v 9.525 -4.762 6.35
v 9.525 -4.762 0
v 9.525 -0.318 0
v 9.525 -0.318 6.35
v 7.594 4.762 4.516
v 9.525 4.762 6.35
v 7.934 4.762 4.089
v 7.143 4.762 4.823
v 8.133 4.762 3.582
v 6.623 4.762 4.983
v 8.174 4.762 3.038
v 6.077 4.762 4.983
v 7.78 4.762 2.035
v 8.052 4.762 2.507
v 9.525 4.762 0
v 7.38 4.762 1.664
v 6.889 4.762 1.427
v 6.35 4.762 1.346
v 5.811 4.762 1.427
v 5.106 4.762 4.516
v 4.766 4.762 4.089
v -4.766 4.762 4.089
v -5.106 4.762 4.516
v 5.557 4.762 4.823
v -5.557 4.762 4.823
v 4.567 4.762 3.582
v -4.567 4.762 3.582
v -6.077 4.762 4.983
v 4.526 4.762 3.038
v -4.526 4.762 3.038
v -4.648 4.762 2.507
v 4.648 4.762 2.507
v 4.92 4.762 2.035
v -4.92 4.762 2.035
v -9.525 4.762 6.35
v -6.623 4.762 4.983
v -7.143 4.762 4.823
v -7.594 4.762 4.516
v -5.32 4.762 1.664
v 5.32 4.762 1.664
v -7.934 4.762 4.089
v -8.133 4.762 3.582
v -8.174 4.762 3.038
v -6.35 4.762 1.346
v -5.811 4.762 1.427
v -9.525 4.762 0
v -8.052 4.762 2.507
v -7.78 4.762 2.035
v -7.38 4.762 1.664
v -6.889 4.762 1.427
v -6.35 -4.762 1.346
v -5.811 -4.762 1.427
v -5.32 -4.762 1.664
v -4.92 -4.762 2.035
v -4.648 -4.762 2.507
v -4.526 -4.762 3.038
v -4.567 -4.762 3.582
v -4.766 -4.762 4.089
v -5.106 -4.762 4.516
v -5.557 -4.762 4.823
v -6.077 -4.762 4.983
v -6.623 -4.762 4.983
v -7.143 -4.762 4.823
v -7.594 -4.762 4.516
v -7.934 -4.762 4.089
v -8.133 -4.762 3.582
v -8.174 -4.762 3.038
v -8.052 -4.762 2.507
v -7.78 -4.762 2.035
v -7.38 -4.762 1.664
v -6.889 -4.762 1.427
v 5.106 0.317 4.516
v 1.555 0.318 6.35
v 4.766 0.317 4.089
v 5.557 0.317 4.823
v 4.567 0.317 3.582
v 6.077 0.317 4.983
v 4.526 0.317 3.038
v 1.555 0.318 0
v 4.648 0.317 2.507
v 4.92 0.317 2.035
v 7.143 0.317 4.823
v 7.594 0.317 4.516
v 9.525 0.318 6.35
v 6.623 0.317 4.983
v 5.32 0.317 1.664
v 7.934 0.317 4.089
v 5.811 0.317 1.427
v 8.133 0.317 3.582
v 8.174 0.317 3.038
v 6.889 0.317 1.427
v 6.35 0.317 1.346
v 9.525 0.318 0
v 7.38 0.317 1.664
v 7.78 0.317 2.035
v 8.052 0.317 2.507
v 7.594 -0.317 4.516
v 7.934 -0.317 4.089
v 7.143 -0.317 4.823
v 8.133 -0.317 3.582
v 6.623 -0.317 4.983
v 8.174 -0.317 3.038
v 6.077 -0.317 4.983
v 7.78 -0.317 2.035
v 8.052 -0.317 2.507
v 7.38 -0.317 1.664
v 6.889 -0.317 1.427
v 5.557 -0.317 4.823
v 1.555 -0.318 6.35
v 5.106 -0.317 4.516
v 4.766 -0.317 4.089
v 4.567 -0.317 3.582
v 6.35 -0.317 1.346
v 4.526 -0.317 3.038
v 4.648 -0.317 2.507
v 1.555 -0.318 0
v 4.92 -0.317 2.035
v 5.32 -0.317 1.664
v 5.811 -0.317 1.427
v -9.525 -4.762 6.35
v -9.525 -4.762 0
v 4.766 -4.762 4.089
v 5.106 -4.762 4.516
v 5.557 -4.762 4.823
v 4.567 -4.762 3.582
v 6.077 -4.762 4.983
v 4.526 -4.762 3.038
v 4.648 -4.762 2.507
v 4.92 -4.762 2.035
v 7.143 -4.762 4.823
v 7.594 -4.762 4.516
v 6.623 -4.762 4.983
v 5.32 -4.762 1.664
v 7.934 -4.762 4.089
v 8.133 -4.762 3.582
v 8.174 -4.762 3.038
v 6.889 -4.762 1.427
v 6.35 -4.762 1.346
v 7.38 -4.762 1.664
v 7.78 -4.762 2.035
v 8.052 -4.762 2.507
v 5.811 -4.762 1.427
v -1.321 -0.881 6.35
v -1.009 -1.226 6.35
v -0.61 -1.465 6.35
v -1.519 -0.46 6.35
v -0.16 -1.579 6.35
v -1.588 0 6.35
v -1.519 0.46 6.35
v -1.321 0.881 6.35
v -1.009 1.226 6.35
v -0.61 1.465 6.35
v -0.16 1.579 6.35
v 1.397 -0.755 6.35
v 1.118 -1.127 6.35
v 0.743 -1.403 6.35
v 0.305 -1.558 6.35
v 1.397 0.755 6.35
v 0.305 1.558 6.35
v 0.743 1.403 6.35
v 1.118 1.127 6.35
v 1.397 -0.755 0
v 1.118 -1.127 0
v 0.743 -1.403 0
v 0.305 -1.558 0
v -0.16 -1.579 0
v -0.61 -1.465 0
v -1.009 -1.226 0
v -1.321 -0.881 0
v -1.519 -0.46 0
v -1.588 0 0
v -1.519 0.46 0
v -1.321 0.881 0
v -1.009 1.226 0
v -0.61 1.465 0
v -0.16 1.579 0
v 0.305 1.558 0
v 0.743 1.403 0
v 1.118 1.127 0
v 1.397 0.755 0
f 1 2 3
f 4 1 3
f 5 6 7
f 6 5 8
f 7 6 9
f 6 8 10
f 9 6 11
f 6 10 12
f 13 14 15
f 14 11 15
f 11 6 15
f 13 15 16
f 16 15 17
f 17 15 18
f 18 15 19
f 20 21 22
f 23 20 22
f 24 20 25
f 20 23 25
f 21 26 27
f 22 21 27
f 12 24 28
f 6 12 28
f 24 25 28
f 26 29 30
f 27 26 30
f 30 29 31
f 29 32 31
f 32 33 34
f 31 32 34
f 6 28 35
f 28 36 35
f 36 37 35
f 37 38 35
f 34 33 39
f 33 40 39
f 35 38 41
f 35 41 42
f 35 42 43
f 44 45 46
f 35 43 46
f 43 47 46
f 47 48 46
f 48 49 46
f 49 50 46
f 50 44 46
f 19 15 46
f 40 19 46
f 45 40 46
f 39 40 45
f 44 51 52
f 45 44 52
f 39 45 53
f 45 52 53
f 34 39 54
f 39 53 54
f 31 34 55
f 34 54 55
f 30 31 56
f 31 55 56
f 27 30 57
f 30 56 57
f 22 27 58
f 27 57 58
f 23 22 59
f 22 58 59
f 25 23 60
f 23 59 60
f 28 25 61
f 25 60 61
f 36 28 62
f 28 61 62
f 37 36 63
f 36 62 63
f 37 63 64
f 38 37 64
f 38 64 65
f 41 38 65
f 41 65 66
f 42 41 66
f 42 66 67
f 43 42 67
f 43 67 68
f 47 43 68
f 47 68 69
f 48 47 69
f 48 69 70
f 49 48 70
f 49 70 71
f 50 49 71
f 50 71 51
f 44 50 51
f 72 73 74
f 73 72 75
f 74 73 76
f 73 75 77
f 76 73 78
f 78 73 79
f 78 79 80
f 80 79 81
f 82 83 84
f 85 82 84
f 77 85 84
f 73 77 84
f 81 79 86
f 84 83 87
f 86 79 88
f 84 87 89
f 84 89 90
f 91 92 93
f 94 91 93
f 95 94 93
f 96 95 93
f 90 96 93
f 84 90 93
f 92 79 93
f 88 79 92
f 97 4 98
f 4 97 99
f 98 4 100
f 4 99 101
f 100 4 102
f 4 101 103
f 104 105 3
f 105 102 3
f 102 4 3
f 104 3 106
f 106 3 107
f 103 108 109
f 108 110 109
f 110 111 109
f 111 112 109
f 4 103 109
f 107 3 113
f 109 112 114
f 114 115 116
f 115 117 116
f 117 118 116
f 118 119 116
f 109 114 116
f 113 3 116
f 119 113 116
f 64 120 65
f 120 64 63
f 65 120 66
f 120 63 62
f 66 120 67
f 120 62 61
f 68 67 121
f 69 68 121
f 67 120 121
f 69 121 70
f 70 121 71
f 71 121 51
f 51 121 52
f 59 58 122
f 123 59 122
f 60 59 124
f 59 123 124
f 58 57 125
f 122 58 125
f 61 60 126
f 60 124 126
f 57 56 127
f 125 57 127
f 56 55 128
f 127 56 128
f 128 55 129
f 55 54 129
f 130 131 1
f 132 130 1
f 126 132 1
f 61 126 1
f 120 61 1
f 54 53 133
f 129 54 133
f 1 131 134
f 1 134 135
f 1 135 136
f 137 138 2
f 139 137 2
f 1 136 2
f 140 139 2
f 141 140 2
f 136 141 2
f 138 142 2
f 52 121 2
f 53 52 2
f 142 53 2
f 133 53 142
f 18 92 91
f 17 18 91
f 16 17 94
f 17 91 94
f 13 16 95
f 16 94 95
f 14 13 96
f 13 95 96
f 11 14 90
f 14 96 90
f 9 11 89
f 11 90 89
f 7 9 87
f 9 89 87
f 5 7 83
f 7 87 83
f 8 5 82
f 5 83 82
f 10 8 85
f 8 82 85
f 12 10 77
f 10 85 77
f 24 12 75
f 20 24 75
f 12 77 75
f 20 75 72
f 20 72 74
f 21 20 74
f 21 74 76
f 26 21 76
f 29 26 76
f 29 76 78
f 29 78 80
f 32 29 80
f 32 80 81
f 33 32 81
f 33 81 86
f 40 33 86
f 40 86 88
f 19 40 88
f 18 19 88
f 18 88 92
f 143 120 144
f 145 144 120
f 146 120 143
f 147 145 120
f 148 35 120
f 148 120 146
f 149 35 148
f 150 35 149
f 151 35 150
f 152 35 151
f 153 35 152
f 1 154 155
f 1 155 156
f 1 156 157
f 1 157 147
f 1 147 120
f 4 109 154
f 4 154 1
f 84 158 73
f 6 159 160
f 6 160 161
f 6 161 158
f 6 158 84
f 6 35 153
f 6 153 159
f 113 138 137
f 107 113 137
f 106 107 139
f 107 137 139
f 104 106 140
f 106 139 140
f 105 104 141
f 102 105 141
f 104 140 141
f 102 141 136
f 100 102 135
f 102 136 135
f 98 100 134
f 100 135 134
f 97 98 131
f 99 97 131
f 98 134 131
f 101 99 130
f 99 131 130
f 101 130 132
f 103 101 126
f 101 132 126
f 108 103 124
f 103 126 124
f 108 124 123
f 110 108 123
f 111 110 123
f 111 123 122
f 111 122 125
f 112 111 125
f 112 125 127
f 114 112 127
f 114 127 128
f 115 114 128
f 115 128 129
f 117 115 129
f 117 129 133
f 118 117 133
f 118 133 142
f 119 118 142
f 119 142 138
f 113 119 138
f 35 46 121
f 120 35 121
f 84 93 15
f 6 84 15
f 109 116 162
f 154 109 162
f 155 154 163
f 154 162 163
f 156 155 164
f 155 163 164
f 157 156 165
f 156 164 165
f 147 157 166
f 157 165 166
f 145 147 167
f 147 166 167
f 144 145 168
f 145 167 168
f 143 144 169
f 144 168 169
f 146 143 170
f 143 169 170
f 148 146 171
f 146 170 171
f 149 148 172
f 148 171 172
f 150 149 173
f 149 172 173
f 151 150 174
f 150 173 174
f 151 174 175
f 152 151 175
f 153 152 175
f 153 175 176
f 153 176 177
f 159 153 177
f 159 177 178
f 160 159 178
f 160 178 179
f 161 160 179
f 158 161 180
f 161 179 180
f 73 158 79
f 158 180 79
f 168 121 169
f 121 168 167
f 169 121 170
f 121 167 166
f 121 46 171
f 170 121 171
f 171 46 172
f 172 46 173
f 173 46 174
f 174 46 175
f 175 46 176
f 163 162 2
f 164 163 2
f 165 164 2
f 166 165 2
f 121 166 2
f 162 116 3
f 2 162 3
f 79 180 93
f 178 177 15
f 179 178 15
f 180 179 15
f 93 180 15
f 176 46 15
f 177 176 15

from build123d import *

# Parameters (mm, degrees)
BOSS_EXTRUDE1_DEPTH = 6.35
SKETCH2_R           = 1.8288
CUT_EXTRUDE1_DEPTH  = 15.892070037


with BuildPart() as part:
    # Sketch1 → Boss-Extrude1 (new body)
    with BuildSketch(Plane.XY):
        with BuildLine():
            Line((-9.525, -4.7625), (9.525, -4.7625))
            Line((9.525, -4.7625), (9.525, -0.3175))
            Line((9.525, -0.3175), (1.555425987, -0.3175))
            ThreePointArc((1.555425987, -0.3175), (-1.5875, 0), (1.555425987, 0.3175))
            Line((1.555425987, 0.3175), (9.525, 0.3175))
            Line((9.525, 0.3175), (9.525, 4.7625))
            Line((9.525, 4.7625), (-9.525, 4.7625))
            Line((-9.525, 4.7625), (-9.525, -4.7625))
        make_face()
    extrude(amount=BOSS_EXTRUDE1_DEPTH)

    # Sketch2 → Cut-Extrude1 (cut, through all)
    with BuildSketch(Plane.XZ.offset(4.7625)):
        with Locations(Location((-6.35, 3.175, 0), (0, 0, 270))):
            Circle(SKETCH2_R)
        with Locations(Location((6.35, 3.175, 0), (0, 0, 270))):
            Circle(SKETCH2_R)
    extrude(amount=-CUT_EXTRUDE1_DEPTH, mode=Mode.SUBTRACT)


solid = part.part
